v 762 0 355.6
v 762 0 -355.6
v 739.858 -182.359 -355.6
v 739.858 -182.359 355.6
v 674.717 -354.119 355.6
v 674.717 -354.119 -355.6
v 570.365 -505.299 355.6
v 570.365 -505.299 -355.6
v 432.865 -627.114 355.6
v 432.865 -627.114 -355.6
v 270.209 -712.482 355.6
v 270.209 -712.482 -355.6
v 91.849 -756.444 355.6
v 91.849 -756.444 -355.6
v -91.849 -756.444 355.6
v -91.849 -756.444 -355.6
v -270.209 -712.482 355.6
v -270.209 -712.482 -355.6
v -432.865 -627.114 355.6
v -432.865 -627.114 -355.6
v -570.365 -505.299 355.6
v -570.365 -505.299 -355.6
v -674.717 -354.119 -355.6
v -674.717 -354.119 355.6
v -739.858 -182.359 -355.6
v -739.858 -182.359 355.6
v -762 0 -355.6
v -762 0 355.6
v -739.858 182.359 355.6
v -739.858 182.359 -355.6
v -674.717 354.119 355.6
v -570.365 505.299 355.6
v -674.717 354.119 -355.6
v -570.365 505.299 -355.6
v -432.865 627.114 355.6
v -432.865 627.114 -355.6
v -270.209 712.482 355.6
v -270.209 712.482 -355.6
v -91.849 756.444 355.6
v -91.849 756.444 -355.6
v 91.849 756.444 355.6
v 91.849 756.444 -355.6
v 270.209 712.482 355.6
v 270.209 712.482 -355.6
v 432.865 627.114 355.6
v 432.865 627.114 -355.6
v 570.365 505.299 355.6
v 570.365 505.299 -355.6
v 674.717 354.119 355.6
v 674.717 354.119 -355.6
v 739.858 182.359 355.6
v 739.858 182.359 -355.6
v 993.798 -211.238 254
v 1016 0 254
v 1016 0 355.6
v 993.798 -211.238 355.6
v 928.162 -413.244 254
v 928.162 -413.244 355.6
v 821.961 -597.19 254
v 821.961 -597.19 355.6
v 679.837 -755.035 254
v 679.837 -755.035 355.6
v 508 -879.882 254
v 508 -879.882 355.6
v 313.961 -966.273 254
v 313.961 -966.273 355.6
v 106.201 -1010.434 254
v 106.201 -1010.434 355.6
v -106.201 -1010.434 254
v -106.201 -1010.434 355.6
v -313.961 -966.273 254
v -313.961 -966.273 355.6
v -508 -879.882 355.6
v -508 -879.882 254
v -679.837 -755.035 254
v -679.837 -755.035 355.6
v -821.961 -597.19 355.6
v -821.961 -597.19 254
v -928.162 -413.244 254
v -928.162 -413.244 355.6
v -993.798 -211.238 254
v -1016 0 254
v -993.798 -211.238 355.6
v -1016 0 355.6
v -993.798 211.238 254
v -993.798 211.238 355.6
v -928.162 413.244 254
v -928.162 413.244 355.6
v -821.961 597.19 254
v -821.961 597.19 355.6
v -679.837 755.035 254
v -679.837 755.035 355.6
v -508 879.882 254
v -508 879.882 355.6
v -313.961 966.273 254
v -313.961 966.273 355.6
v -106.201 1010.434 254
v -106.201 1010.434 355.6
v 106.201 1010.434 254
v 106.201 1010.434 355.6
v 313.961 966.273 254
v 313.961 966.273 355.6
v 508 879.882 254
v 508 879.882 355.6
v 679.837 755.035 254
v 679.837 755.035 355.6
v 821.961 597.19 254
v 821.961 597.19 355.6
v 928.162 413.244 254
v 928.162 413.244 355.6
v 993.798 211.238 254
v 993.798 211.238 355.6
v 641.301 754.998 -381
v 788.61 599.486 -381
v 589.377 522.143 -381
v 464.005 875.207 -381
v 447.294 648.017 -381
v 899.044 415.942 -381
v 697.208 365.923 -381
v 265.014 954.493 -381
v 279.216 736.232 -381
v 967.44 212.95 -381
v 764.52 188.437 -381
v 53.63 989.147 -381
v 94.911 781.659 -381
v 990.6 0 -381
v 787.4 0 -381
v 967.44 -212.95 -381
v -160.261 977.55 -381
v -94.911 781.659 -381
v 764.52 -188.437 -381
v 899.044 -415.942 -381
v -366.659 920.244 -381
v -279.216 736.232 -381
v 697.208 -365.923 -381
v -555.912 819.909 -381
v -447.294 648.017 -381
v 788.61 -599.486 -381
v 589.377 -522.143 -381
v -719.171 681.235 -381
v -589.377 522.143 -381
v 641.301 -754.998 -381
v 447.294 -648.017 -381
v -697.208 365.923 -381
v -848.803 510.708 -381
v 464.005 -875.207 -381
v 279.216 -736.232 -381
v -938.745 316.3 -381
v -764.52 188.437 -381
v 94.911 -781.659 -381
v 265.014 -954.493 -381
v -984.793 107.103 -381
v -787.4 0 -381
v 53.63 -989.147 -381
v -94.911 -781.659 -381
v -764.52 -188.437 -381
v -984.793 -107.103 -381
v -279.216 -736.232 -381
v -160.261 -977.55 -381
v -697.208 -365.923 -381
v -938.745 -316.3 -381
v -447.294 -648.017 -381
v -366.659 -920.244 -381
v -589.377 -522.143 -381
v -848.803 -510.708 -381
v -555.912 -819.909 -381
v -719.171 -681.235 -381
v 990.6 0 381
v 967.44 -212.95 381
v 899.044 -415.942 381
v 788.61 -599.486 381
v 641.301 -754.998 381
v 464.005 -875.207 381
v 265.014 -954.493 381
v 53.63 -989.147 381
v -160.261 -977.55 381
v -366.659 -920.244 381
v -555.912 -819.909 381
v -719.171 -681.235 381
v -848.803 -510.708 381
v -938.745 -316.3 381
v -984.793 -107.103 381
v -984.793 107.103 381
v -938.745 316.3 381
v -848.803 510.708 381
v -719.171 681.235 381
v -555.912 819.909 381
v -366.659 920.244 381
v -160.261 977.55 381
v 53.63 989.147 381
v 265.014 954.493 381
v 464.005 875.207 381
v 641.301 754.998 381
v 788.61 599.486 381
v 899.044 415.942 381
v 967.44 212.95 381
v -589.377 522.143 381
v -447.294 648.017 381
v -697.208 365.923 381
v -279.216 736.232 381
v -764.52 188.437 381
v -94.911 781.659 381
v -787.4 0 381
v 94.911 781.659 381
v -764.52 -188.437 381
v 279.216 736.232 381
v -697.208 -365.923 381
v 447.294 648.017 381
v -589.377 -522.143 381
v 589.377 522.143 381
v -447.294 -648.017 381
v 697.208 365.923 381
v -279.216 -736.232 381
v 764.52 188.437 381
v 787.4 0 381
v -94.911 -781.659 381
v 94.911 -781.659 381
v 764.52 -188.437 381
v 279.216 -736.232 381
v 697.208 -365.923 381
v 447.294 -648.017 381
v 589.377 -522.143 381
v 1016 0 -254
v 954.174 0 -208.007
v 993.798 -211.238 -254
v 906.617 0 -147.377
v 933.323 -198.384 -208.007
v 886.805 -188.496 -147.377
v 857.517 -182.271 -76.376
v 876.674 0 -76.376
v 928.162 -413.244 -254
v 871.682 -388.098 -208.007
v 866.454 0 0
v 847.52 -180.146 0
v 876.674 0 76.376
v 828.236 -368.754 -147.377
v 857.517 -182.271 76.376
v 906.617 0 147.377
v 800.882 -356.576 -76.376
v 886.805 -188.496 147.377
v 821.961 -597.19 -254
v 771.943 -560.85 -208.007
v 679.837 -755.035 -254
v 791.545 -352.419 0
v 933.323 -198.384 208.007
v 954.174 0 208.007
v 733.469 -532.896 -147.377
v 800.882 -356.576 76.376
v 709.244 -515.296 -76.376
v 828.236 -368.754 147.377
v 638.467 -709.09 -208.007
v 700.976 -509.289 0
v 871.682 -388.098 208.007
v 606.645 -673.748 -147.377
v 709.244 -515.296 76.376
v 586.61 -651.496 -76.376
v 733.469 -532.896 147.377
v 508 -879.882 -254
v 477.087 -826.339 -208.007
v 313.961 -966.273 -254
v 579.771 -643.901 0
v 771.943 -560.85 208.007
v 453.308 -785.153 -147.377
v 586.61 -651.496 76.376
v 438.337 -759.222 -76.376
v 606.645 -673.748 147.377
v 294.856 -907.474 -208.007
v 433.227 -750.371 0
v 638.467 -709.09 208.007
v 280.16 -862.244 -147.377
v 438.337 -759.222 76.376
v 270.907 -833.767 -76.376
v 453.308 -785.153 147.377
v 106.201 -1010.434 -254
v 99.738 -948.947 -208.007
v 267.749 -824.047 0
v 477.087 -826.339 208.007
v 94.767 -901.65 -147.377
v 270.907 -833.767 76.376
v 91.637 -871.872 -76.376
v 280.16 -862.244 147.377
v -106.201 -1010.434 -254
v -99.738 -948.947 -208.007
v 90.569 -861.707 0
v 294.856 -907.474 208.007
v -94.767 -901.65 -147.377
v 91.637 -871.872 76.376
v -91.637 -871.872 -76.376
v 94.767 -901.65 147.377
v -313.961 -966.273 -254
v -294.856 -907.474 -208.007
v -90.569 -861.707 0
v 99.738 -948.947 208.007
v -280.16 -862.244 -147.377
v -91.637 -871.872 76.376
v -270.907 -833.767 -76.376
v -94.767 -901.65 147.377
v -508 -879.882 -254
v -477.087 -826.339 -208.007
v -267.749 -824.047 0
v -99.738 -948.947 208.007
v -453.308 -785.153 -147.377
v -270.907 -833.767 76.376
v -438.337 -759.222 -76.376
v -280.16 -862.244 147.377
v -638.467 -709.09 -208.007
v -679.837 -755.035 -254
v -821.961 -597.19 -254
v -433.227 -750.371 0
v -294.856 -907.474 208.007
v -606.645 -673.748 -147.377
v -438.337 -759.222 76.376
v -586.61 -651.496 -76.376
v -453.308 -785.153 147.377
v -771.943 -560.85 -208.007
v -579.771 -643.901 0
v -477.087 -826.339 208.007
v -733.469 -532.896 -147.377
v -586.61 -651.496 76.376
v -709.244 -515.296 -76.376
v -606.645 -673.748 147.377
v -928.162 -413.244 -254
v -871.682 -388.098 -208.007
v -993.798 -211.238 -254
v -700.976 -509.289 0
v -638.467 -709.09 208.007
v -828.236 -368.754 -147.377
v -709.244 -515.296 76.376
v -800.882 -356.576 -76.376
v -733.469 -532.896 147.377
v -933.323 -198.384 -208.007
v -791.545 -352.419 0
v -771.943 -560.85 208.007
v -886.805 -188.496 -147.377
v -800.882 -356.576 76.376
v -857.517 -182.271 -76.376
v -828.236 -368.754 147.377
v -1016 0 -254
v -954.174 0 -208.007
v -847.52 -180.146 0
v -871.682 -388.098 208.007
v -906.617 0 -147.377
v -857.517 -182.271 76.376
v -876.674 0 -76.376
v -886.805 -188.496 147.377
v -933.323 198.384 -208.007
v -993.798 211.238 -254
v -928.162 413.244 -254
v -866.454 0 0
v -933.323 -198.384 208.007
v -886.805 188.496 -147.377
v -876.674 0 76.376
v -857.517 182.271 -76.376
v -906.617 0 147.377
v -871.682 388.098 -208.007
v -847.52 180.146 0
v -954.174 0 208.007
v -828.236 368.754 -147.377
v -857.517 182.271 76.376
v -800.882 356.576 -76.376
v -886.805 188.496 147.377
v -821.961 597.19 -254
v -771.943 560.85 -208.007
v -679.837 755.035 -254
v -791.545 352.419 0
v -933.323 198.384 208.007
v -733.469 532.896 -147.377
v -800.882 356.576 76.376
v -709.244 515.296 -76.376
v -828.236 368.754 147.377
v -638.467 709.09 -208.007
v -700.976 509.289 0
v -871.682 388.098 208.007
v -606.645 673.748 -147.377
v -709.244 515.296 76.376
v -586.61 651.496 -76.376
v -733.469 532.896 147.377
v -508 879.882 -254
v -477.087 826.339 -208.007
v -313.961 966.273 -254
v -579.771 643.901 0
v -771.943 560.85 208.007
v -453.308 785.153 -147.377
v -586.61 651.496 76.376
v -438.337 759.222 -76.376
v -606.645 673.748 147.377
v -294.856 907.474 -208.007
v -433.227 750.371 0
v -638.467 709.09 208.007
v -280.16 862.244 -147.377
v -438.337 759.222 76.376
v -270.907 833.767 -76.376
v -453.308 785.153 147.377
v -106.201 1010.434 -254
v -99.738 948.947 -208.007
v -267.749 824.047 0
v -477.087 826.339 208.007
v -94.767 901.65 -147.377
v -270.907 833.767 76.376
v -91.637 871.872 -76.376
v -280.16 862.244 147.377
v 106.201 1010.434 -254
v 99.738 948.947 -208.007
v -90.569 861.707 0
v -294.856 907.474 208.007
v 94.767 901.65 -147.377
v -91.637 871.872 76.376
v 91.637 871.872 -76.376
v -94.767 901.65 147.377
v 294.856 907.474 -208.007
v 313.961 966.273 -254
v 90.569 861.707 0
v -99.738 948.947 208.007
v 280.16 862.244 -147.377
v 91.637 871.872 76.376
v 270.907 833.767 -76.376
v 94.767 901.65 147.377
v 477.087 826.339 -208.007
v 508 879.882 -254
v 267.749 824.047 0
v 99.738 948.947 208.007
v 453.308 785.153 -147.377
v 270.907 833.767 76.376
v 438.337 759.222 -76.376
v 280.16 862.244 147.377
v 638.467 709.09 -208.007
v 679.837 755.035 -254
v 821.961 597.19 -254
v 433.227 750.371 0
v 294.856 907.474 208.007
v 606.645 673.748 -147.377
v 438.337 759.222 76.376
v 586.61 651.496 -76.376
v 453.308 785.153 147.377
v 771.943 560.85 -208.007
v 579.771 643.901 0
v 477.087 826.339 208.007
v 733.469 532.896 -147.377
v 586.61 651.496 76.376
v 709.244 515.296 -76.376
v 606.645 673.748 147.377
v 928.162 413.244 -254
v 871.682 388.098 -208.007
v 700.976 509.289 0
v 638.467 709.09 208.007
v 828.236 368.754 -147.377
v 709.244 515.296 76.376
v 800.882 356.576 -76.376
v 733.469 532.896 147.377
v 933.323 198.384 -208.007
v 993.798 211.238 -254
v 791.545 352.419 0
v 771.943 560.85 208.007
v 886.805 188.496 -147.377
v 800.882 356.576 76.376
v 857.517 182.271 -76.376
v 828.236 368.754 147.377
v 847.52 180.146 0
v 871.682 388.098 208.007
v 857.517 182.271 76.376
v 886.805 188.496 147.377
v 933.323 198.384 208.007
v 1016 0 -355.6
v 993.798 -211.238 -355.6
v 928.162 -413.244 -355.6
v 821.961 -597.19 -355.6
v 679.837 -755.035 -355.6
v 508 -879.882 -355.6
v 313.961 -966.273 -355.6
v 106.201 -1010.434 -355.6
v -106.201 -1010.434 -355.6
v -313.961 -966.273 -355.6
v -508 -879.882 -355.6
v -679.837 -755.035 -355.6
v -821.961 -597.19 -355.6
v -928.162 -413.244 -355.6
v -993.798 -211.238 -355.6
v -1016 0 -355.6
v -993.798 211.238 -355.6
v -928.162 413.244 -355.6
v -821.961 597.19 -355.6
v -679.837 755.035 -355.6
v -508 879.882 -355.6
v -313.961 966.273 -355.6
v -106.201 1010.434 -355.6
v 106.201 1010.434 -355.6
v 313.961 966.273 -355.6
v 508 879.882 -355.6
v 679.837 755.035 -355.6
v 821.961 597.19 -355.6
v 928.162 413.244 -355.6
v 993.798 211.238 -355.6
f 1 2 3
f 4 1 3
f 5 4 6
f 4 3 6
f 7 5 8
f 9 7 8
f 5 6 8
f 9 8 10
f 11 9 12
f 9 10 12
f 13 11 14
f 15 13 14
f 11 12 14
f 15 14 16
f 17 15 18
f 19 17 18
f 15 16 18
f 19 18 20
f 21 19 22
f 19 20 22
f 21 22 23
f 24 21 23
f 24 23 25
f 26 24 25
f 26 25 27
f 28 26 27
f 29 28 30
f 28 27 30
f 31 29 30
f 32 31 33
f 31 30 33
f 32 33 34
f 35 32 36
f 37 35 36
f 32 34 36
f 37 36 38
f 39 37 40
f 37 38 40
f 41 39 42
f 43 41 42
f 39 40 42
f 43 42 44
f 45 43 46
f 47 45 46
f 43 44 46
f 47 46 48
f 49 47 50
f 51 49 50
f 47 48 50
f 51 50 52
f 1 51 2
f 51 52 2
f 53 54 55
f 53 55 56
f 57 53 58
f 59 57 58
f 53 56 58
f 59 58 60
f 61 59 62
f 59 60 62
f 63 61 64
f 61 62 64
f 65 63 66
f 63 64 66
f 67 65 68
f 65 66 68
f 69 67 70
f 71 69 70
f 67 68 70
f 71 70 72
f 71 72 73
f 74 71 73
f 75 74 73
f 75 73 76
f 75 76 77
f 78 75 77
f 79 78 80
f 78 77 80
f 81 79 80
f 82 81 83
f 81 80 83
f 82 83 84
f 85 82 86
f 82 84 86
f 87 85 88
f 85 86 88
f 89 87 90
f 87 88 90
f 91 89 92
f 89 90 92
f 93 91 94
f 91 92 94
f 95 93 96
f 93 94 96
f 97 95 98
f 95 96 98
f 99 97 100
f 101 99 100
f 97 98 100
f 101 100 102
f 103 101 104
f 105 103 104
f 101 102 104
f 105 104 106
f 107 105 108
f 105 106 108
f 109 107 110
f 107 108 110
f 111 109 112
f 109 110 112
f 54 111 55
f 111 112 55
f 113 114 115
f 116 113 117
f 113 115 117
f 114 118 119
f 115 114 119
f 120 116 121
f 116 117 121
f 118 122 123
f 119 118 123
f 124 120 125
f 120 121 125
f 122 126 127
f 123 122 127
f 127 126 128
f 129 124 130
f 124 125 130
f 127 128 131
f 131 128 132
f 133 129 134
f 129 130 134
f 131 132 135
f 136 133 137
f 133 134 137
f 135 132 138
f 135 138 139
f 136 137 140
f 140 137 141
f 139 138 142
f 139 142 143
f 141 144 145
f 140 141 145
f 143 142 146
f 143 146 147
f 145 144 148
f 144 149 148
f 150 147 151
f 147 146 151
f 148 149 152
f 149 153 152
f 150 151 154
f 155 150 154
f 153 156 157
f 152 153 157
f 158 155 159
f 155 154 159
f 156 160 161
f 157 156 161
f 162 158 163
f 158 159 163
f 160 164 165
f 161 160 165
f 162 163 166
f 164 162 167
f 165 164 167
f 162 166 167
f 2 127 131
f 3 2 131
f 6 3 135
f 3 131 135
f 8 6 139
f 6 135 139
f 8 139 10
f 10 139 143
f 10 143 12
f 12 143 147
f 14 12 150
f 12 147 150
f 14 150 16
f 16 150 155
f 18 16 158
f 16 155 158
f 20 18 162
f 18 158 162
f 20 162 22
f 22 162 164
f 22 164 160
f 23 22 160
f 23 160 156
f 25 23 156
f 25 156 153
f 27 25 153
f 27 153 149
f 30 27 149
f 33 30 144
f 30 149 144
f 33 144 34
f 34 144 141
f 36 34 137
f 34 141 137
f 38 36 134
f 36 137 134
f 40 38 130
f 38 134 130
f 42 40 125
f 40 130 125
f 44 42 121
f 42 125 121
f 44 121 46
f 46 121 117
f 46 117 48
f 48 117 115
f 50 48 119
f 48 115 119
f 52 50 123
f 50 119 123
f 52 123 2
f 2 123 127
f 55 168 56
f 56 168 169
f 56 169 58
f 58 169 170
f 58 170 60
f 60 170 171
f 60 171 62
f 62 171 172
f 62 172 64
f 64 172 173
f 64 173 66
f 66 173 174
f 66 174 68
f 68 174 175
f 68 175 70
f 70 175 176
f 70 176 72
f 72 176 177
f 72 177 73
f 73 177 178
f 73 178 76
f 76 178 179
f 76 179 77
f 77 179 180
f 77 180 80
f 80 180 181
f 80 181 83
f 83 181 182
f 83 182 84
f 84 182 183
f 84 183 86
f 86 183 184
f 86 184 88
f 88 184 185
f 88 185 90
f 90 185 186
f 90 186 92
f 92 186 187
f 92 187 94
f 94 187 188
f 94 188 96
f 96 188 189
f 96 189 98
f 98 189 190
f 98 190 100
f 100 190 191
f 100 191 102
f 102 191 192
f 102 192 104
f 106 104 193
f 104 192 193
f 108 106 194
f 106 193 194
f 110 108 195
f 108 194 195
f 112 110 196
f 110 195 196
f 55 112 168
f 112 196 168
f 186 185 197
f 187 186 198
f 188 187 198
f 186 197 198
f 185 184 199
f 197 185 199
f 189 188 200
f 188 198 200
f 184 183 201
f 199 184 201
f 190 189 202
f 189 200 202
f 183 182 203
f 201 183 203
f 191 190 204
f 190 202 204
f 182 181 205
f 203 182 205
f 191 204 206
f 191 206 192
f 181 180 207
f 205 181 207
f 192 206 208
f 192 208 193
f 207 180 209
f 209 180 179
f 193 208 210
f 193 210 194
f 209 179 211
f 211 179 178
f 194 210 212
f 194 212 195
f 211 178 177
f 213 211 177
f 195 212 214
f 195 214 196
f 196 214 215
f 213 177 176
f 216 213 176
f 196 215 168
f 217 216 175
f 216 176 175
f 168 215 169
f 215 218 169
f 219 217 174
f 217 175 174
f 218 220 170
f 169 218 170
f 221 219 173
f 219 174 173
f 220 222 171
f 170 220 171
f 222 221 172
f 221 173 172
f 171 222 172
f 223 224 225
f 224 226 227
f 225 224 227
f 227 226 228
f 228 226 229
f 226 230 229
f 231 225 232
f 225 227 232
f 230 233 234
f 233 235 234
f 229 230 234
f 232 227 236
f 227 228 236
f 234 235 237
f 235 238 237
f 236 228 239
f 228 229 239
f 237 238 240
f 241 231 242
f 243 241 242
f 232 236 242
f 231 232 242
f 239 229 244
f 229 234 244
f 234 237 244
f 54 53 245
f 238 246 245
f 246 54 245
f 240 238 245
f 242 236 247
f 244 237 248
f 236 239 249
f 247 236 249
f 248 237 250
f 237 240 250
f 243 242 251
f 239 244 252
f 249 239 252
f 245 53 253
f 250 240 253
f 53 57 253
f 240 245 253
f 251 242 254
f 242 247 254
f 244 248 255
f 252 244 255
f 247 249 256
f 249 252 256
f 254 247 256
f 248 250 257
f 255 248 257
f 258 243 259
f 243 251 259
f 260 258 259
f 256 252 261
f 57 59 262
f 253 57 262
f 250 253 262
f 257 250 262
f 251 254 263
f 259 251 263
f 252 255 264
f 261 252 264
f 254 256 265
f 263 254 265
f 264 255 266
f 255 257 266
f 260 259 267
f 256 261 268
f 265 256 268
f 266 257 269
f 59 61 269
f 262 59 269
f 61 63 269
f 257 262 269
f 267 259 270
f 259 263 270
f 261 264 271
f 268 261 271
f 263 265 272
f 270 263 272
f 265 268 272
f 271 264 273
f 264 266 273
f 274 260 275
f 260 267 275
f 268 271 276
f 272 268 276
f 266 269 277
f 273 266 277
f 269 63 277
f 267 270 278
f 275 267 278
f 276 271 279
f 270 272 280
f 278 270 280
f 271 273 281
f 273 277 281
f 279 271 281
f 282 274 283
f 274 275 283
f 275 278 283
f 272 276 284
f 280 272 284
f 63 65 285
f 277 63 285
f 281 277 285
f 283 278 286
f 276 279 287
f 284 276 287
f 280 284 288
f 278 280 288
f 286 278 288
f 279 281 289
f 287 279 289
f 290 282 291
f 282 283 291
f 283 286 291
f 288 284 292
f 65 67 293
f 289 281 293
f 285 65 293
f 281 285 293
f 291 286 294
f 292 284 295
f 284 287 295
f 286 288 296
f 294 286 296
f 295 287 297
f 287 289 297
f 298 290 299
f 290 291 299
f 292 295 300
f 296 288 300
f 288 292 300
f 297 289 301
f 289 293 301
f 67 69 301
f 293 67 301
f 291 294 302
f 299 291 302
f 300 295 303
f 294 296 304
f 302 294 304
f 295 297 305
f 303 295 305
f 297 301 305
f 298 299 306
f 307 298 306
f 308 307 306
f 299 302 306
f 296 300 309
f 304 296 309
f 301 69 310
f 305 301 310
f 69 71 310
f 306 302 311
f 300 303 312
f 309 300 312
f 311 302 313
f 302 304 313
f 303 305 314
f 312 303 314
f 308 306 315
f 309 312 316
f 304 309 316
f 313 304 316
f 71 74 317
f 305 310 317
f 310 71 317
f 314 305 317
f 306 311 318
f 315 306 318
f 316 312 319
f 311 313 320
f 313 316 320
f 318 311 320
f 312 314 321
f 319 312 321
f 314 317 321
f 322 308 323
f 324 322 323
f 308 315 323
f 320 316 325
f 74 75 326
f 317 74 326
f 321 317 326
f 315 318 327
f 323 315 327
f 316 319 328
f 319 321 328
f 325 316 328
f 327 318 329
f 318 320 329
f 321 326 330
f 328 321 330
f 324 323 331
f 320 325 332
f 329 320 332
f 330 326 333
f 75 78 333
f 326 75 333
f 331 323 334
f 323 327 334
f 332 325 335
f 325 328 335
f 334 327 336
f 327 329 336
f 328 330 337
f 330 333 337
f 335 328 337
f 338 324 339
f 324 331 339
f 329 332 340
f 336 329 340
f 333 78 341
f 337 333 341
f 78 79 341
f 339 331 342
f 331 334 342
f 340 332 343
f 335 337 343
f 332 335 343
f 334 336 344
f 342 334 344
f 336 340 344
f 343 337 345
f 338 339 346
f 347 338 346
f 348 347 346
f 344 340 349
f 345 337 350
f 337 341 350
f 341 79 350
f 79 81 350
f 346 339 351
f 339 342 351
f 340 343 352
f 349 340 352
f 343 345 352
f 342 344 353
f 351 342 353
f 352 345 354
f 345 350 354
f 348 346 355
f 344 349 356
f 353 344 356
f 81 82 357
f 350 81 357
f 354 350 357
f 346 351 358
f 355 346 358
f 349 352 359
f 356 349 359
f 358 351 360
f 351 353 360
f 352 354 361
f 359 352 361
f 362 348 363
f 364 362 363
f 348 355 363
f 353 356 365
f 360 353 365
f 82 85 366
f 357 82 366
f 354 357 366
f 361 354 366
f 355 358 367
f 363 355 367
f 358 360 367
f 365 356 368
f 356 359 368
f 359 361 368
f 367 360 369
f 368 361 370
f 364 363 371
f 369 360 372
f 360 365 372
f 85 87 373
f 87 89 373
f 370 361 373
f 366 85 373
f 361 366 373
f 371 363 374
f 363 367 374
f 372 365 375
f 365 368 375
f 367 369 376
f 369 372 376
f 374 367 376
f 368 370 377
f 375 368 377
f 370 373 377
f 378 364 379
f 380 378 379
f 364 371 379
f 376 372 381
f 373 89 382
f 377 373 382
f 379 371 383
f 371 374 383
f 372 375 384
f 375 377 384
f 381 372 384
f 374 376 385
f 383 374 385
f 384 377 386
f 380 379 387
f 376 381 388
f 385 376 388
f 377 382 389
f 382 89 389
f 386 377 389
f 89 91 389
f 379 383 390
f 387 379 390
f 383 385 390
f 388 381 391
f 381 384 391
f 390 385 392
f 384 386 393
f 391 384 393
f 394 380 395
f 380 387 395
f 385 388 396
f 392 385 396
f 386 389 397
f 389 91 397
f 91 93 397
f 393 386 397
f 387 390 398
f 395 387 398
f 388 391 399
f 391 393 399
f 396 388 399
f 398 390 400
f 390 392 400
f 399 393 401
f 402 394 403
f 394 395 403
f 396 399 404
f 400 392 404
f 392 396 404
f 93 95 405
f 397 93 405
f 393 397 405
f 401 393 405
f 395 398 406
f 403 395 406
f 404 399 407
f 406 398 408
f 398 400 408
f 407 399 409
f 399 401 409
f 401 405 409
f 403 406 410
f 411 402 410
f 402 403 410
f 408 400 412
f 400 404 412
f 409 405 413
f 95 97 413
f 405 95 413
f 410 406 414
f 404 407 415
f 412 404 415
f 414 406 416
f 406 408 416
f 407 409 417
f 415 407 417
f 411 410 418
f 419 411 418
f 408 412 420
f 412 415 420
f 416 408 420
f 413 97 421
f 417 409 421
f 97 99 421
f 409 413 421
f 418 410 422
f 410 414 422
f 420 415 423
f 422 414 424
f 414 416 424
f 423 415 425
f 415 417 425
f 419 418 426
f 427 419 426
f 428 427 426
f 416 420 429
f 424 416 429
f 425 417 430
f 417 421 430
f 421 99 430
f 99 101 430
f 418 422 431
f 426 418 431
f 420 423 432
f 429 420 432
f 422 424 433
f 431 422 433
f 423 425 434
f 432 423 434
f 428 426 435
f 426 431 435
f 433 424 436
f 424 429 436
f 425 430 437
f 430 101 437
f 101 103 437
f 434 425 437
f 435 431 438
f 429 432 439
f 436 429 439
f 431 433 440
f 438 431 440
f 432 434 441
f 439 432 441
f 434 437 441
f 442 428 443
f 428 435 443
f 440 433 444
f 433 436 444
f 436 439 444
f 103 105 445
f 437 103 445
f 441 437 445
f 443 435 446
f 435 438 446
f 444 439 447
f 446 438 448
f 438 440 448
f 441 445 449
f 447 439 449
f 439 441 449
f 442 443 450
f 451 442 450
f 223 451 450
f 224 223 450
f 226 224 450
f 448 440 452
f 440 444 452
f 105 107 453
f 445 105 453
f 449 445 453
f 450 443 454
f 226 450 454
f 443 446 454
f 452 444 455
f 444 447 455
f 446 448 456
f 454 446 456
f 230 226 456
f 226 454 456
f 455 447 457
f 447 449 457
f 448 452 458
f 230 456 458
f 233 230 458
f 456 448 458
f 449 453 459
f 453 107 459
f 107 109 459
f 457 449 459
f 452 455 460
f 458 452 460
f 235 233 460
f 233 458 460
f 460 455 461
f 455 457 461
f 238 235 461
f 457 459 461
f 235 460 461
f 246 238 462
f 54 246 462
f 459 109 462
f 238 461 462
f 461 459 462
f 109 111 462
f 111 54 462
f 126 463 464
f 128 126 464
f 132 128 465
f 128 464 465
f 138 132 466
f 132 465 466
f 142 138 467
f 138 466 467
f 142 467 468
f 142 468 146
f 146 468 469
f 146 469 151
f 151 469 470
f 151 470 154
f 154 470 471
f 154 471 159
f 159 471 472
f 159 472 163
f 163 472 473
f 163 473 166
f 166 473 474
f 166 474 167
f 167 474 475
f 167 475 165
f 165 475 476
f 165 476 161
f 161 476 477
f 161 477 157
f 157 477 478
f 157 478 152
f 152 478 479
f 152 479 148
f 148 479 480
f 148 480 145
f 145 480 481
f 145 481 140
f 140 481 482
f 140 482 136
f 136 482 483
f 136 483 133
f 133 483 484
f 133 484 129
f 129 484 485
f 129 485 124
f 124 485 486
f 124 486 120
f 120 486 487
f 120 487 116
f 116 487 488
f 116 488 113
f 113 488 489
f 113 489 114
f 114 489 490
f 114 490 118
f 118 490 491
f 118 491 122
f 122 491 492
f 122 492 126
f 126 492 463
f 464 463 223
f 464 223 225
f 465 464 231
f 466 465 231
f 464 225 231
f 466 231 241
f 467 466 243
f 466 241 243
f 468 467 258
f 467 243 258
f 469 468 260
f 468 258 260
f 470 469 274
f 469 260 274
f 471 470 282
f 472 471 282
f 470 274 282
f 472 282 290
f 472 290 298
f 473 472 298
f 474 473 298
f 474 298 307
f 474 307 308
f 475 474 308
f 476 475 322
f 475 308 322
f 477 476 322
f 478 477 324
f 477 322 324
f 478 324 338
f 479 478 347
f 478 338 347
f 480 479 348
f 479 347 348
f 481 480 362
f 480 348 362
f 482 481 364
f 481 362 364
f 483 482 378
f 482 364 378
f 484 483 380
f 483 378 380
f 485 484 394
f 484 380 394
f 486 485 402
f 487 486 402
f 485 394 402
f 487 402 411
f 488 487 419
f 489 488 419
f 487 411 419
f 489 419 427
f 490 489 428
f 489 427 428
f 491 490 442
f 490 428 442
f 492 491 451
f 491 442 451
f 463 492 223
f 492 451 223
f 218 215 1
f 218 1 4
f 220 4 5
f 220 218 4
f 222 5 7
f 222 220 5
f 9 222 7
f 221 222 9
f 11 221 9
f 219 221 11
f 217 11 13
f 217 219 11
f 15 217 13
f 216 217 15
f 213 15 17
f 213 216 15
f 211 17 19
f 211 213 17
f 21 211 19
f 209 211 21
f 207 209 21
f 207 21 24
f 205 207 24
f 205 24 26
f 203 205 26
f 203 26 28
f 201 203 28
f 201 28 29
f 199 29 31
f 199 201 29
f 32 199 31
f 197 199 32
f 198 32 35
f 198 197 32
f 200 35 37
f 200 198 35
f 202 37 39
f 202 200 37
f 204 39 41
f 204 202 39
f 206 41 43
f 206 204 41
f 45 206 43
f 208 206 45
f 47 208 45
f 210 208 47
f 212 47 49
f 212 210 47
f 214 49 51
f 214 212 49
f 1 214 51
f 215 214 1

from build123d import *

# Parameters (mm, degrees)
CHAMFER1_SIZE = 25.4


with BuildPart() as part:
    # Sketch1 → Revolve1 (revolve)
    with BuildSketch(Plane(origin=(0, 0, 0), x_dir=(0, 0, -1), z_dir=(1, 0, 0)), mode=Mode.PRIVATE) as revolve1_sk:
        with BuildLine():
            Line((-381, 762), (381, 762))
            Line((381, 762), (381, 1016))
            Line((381, 1016), (254, 1016))
            ThreePointArc((254, 1016), (0, 866.453801319), (-254, 1016))
            Line((-254, 1016), (-381, 1016))
            Line((-381, 1016), (-381, 762))
        make_face()
    revolve(revolve1_sk.sketch.rotate(Axis((0, 0, 0), (0, 0, -1)), 90), axis=Axis((0, 0, 0), (0, 0, -1)))

    # Chamfer1
    chamfer1_edges = [part.edges().sort_by_distance(p)[0] for p in [
        (-1016, 0, -381),
        (-762, 0, -381),
        (-762, 0, 381),
        (-1016, 0, 381),
    ]]
    chamfer(chamfer1_edges, length=CHAMFER1_SIZE)


solid = part.part
